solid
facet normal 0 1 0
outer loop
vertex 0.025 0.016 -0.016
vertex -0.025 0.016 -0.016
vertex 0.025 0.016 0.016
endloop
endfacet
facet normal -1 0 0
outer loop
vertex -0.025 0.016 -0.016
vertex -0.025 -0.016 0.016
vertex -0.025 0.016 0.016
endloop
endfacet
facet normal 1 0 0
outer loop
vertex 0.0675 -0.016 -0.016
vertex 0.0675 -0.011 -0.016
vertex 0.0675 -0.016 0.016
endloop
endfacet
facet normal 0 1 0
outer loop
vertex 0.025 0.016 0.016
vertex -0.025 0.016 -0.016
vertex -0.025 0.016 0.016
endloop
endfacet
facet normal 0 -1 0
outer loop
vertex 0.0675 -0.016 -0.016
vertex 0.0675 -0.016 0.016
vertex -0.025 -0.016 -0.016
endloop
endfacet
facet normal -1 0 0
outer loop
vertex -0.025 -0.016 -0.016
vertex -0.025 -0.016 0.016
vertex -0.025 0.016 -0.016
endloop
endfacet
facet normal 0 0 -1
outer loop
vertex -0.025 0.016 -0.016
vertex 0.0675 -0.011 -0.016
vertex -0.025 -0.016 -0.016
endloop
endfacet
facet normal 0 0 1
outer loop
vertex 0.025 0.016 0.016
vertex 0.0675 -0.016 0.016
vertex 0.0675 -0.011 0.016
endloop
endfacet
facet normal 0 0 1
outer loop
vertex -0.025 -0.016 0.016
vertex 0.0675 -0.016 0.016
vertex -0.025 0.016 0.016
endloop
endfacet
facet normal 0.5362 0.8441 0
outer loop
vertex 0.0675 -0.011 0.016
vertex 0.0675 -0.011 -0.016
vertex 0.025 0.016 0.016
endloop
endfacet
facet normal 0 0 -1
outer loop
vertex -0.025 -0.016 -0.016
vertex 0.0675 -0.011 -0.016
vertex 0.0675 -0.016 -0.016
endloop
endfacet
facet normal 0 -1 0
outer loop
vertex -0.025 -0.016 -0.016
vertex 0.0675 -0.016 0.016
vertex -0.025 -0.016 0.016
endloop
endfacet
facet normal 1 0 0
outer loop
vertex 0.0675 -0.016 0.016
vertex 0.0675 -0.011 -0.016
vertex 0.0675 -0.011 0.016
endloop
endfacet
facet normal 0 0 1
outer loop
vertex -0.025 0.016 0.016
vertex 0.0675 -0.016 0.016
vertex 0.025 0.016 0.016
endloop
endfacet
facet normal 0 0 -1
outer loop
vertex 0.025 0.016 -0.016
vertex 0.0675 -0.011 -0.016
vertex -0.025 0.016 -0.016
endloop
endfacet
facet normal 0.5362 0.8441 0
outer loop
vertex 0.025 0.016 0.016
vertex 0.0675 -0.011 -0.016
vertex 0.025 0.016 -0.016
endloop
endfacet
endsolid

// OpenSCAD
// file: arm_basic_low.scad
// A simplified model for the basic low arm part of Darwin-OP.
// The basic arm is with 3 DOF without gripper at the end. 

module arm_gripper() {
    hull() { 
        cube([50, 32, 32], center = true);
        translate([45, 0, -13.5]) cube([45, 32, 5], center = true);
    }
}

arm_gripper();
// main file
use <arm_basic_low.scad>

// Gazebo uses m as default measure unit for stl generated by
// OpenSCAD so we have to scale to mm.
scale_factor = 0.001;

scale([scale_factor, scale_factor, scale_factor])
rotate([-90, 0, 0])
    arm_gripper();
